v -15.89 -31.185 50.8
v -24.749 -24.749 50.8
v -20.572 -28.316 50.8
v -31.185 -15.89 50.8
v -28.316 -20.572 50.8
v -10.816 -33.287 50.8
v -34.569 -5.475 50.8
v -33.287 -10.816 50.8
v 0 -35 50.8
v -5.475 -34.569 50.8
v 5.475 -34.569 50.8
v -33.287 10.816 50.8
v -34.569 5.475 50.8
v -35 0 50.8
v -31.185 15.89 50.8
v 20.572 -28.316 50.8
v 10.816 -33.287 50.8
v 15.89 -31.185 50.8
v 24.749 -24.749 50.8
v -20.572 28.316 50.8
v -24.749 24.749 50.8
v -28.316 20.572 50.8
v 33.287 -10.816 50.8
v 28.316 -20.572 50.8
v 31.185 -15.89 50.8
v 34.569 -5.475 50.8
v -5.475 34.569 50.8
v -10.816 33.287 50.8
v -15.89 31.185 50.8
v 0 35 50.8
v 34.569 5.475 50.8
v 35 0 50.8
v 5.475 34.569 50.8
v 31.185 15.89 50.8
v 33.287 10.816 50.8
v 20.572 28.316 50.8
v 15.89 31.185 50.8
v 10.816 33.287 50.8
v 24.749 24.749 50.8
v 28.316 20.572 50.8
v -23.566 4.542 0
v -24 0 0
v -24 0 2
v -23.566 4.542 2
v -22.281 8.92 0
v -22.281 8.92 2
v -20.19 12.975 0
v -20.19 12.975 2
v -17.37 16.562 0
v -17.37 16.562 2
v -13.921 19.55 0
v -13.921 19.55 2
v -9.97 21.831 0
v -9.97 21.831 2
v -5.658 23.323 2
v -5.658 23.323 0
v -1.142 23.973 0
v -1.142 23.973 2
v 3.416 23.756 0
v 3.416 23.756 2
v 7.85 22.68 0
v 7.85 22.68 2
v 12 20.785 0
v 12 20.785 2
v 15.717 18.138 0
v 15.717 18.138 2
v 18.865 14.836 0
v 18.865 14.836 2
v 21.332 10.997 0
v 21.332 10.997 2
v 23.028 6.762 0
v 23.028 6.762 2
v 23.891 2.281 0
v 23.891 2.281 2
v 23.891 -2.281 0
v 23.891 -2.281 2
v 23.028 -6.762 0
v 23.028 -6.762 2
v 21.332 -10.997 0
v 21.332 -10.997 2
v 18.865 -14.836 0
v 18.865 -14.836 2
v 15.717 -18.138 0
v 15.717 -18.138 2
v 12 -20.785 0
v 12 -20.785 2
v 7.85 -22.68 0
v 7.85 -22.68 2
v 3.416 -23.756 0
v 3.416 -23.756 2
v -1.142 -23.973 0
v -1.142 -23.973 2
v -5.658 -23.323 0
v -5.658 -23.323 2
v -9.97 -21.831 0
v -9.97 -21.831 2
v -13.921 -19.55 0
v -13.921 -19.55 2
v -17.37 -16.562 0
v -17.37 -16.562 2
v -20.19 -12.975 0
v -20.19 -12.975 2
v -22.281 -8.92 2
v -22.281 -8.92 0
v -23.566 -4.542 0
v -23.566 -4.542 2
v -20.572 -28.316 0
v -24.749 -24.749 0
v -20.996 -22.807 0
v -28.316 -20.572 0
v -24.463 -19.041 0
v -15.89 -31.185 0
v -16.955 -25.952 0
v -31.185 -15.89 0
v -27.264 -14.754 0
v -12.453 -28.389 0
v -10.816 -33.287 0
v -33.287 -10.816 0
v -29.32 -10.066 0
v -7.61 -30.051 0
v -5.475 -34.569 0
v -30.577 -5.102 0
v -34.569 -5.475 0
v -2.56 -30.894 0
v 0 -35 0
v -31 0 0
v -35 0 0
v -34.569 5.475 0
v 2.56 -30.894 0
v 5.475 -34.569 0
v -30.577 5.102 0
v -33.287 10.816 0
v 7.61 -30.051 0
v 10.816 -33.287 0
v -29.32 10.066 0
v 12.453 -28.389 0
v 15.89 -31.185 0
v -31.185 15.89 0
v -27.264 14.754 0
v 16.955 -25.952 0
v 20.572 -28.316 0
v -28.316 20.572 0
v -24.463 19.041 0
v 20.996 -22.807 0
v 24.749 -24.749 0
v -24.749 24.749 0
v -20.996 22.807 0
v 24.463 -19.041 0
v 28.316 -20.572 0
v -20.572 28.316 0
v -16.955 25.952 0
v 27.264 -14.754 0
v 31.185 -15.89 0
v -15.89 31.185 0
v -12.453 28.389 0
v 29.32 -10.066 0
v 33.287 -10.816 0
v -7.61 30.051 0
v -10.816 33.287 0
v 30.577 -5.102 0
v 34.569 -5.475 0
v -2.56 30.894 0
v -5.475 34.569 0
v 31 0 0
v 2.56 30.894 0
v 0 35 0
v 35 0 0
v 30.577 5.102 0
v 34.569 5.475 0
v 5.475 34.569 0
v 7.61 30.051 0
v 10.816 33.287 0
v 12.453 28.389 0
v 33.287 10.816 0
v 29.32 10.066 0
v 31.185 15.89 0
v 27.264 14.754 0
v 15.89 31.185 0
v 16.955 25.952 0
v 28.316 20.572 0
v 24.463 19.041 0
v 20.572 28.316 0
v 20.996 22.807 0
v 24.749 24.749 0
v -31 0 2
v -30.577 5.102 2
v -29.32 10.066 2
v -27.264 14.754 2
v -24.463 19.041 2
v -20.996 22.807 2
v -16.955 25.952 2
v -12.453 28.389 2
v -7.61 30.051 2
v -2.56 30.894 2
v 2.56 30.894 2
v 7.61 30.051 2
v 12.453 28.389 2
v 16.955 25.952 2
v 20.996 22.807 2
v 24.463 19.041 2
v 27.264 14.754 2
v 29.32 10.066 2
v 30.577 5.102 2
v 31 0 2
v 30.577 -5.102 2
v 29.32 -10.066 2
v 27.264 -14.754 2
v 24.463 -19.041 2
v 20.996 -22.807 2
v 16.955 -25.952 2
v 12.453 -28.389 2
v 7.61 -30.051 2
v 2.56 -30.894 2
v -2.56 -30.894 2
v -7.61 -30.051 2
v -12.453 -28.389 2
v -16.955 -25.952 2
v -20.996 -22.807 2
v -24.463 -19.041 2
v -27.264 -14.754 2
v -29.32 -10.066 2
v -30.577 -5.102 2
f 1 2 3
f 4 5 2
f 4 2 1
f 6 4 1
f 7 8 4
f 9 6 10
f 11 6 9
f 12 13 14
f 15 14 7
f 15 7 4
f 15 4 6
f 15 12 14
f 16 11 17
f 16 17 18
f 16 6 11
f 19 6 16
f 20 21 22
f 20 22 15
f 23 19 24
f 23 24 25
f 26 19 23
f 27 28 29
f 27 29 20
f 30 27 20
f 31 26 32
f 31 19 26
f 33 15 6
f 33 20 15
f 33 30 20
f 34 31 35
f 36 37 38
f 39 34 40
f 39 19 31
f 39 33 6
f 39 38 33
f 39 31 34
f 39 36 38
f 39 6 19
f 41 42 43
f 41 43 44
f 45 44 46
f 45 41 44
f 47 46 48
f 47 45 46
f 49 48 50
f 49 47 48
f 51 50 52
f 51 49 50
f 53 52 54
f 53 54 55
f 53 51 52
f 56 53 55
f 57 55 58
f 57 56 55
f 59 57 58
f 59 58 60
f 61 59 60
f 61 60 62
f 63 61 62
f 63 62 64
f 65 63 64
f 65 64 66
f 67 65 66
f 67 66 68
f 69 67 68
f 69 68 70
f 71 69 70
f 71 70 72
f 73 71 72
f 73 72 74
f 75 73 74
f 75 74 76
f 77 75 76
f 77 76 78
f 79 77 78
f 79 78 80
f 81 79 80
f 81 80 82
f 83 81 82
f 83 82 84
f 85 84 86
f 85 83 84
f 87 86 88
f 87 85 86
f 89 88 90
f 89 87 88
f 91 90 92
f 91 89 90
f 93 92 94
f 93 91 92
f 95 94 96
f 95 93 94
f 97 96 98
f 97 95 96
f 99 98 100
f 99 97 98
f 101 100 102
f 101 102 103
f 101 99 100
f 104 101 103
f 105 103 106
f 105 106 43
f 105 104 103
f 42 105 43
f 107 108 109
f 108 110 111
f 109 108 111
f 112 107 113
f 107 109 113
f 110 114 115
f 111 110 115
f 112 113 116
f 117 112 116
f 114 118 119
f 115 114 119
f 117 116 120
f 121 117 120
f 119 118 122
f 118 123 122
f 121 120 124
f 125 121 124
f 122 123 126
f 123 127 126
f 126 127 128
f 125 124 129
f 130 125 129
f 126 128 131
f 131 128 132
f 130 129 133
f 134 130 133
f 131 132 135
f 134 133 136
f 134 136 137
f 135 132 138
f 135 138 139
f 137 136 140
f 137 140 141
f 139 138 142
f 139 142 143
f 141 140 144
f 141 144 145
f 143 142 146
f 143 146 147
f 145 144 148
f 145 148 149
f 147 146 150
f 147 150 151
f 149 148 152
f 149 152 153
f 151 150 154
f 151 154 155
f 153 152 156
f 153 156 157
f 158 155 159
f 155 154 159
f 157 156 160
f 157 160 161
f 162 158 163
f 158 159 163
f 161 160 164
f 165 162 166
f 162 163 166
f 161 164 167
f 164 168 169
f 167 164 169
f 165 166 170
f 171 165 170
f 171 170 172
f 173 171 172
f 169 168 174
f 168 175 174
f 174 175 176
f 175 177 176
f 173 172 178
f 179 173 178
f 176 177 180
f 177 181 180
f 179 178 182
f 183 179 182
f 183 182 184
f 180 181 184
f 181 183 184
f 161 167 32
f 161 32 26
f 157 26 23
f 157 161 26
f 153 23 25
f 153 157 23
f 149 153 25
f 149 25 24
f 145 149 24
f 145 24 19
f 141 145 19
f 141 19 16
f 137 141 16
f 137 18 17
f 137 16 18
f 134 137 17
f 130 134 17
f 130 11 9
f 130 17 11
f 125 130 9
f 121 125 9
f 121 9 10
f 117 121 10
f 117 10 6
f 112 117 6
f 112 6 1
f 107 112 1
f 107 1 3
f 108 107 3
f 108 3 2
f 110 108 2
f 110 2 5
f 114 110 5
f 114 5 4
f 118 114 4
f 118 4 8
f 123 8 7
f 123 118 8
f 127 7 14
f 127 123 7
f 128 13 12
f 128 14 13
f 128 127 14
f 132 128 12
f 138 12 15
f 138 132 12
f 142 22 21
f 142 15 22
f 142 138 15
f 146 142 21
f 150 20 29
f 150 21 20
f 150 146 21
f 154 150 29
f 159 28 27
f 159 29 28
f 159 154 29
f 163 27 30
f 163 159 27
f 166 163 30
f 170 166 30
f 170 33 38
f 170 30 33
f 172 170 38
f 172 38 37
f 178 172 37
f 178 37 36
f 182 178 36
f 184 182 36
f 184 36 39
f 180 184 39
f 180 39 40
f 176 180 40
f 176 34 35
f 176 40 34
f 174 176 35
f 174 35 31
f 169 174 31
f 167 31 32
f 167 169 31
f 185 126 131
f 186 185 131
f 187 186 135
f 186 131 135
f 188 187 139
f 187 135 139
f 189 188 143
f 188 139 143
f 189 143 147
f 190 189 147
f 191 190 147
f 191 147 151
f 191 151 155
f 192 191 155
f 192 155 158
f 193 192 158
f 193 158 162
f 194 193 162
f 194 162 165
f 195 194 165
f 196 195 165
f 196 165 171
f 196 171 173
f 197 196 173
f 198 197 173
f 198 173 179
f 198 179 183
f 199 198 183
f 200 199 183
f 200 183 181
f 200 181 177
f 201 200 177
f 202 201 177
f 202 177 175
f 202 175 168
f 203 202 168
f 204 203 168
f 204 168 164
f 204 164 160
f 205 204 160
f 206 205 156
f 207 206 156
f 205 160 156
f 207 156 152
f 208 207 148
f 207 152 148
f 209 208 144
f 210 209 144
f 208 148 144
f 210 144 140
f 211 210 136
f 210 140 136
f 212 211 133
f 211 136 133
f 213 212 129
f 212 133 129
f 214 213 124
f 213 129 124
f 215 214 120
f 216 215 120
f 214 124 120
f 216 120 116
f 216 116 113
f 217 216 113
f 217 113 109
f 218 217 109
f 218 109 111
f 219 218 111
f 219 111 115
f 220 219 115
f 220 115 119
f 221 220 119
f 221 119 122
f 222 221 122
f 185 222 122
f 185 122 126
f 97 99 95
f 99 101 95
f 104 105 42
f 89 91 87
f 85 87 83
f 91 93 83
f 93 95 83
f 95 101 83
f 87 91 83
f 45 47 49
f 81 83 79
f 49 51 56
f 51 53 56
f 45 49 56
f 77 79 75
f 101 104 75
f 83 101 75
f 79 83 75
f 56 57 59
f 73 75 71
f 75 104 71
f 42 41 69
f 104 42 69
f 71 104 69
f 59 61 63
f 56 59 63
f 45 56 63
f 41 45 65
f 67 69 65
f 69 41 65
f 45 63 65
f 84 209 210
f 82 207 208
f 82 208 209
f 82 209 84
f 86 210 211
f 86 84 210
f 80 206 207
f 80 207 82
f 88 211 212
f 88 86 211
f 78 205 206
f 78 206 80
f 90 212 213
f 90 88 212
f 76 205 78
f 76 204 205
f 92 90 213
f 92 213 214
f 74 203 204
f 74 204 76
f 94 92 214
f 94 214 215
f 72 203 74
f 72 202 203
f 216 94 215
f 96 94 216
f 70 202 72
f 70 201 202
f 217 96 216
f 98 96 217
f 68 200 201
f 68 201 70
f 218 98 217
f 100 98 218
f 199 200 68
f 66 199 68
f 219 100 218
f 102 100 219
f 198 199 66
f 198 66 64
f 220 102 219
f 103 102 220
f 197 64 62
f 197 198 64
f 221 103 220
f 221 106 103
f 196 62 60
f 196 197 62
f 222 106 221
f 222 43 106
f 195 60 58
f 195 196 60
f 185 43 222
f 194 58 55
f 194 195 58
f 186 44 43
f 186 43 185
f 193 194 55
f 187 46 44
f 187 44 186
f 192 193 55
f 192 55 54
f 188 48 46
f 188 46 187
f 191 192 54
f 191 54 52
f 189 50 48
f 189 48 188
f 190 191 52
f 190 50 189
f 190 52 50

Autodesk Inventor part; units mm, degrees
ref_plane "XZ Plane" through (0, 0, 0) normal (0, 1, 0) x (-1, 0, 0)
ref_plane "XY Plane" through (0, 0, 0) normal (0, 0, 1) x (1, 0, 0)
sketch "Sketch1" plane through (0, 0, 0) normal (0, 0, 1) x (1, 0, 0)
  circle A0 centre (0, 0) radius 35
  dimension "d0" = 70
extrude "Extrusion1" add sketch "Sketch1" along normal blind 50.8
sketch "Sketch2" plane through (0, 0, 0) normal (0, 0, -1) x (-1, 0, 0)
  circle A0 centre (0, 0) radius 31
  circle A1 centre (0, 0) radius 24
  dimension "d3" = 62
  dimension "d4" = 48
extrude "Extrusion2" cut sketch "Sketch2" against normal blind 2
equation "\"d3\" = ringOuterDiam + ringDiamGap"
equation "\"d4\" = ringInnerDiam - ringDiamGap"
equation "\"ringOuterDiam\" = 60"
equation "\"ringInnerDiam\" = 50"
equation "\"ringThickness\" = 1.5"
equation "\"ringDiamGap\" = 2"
properties part number "MountV01"
